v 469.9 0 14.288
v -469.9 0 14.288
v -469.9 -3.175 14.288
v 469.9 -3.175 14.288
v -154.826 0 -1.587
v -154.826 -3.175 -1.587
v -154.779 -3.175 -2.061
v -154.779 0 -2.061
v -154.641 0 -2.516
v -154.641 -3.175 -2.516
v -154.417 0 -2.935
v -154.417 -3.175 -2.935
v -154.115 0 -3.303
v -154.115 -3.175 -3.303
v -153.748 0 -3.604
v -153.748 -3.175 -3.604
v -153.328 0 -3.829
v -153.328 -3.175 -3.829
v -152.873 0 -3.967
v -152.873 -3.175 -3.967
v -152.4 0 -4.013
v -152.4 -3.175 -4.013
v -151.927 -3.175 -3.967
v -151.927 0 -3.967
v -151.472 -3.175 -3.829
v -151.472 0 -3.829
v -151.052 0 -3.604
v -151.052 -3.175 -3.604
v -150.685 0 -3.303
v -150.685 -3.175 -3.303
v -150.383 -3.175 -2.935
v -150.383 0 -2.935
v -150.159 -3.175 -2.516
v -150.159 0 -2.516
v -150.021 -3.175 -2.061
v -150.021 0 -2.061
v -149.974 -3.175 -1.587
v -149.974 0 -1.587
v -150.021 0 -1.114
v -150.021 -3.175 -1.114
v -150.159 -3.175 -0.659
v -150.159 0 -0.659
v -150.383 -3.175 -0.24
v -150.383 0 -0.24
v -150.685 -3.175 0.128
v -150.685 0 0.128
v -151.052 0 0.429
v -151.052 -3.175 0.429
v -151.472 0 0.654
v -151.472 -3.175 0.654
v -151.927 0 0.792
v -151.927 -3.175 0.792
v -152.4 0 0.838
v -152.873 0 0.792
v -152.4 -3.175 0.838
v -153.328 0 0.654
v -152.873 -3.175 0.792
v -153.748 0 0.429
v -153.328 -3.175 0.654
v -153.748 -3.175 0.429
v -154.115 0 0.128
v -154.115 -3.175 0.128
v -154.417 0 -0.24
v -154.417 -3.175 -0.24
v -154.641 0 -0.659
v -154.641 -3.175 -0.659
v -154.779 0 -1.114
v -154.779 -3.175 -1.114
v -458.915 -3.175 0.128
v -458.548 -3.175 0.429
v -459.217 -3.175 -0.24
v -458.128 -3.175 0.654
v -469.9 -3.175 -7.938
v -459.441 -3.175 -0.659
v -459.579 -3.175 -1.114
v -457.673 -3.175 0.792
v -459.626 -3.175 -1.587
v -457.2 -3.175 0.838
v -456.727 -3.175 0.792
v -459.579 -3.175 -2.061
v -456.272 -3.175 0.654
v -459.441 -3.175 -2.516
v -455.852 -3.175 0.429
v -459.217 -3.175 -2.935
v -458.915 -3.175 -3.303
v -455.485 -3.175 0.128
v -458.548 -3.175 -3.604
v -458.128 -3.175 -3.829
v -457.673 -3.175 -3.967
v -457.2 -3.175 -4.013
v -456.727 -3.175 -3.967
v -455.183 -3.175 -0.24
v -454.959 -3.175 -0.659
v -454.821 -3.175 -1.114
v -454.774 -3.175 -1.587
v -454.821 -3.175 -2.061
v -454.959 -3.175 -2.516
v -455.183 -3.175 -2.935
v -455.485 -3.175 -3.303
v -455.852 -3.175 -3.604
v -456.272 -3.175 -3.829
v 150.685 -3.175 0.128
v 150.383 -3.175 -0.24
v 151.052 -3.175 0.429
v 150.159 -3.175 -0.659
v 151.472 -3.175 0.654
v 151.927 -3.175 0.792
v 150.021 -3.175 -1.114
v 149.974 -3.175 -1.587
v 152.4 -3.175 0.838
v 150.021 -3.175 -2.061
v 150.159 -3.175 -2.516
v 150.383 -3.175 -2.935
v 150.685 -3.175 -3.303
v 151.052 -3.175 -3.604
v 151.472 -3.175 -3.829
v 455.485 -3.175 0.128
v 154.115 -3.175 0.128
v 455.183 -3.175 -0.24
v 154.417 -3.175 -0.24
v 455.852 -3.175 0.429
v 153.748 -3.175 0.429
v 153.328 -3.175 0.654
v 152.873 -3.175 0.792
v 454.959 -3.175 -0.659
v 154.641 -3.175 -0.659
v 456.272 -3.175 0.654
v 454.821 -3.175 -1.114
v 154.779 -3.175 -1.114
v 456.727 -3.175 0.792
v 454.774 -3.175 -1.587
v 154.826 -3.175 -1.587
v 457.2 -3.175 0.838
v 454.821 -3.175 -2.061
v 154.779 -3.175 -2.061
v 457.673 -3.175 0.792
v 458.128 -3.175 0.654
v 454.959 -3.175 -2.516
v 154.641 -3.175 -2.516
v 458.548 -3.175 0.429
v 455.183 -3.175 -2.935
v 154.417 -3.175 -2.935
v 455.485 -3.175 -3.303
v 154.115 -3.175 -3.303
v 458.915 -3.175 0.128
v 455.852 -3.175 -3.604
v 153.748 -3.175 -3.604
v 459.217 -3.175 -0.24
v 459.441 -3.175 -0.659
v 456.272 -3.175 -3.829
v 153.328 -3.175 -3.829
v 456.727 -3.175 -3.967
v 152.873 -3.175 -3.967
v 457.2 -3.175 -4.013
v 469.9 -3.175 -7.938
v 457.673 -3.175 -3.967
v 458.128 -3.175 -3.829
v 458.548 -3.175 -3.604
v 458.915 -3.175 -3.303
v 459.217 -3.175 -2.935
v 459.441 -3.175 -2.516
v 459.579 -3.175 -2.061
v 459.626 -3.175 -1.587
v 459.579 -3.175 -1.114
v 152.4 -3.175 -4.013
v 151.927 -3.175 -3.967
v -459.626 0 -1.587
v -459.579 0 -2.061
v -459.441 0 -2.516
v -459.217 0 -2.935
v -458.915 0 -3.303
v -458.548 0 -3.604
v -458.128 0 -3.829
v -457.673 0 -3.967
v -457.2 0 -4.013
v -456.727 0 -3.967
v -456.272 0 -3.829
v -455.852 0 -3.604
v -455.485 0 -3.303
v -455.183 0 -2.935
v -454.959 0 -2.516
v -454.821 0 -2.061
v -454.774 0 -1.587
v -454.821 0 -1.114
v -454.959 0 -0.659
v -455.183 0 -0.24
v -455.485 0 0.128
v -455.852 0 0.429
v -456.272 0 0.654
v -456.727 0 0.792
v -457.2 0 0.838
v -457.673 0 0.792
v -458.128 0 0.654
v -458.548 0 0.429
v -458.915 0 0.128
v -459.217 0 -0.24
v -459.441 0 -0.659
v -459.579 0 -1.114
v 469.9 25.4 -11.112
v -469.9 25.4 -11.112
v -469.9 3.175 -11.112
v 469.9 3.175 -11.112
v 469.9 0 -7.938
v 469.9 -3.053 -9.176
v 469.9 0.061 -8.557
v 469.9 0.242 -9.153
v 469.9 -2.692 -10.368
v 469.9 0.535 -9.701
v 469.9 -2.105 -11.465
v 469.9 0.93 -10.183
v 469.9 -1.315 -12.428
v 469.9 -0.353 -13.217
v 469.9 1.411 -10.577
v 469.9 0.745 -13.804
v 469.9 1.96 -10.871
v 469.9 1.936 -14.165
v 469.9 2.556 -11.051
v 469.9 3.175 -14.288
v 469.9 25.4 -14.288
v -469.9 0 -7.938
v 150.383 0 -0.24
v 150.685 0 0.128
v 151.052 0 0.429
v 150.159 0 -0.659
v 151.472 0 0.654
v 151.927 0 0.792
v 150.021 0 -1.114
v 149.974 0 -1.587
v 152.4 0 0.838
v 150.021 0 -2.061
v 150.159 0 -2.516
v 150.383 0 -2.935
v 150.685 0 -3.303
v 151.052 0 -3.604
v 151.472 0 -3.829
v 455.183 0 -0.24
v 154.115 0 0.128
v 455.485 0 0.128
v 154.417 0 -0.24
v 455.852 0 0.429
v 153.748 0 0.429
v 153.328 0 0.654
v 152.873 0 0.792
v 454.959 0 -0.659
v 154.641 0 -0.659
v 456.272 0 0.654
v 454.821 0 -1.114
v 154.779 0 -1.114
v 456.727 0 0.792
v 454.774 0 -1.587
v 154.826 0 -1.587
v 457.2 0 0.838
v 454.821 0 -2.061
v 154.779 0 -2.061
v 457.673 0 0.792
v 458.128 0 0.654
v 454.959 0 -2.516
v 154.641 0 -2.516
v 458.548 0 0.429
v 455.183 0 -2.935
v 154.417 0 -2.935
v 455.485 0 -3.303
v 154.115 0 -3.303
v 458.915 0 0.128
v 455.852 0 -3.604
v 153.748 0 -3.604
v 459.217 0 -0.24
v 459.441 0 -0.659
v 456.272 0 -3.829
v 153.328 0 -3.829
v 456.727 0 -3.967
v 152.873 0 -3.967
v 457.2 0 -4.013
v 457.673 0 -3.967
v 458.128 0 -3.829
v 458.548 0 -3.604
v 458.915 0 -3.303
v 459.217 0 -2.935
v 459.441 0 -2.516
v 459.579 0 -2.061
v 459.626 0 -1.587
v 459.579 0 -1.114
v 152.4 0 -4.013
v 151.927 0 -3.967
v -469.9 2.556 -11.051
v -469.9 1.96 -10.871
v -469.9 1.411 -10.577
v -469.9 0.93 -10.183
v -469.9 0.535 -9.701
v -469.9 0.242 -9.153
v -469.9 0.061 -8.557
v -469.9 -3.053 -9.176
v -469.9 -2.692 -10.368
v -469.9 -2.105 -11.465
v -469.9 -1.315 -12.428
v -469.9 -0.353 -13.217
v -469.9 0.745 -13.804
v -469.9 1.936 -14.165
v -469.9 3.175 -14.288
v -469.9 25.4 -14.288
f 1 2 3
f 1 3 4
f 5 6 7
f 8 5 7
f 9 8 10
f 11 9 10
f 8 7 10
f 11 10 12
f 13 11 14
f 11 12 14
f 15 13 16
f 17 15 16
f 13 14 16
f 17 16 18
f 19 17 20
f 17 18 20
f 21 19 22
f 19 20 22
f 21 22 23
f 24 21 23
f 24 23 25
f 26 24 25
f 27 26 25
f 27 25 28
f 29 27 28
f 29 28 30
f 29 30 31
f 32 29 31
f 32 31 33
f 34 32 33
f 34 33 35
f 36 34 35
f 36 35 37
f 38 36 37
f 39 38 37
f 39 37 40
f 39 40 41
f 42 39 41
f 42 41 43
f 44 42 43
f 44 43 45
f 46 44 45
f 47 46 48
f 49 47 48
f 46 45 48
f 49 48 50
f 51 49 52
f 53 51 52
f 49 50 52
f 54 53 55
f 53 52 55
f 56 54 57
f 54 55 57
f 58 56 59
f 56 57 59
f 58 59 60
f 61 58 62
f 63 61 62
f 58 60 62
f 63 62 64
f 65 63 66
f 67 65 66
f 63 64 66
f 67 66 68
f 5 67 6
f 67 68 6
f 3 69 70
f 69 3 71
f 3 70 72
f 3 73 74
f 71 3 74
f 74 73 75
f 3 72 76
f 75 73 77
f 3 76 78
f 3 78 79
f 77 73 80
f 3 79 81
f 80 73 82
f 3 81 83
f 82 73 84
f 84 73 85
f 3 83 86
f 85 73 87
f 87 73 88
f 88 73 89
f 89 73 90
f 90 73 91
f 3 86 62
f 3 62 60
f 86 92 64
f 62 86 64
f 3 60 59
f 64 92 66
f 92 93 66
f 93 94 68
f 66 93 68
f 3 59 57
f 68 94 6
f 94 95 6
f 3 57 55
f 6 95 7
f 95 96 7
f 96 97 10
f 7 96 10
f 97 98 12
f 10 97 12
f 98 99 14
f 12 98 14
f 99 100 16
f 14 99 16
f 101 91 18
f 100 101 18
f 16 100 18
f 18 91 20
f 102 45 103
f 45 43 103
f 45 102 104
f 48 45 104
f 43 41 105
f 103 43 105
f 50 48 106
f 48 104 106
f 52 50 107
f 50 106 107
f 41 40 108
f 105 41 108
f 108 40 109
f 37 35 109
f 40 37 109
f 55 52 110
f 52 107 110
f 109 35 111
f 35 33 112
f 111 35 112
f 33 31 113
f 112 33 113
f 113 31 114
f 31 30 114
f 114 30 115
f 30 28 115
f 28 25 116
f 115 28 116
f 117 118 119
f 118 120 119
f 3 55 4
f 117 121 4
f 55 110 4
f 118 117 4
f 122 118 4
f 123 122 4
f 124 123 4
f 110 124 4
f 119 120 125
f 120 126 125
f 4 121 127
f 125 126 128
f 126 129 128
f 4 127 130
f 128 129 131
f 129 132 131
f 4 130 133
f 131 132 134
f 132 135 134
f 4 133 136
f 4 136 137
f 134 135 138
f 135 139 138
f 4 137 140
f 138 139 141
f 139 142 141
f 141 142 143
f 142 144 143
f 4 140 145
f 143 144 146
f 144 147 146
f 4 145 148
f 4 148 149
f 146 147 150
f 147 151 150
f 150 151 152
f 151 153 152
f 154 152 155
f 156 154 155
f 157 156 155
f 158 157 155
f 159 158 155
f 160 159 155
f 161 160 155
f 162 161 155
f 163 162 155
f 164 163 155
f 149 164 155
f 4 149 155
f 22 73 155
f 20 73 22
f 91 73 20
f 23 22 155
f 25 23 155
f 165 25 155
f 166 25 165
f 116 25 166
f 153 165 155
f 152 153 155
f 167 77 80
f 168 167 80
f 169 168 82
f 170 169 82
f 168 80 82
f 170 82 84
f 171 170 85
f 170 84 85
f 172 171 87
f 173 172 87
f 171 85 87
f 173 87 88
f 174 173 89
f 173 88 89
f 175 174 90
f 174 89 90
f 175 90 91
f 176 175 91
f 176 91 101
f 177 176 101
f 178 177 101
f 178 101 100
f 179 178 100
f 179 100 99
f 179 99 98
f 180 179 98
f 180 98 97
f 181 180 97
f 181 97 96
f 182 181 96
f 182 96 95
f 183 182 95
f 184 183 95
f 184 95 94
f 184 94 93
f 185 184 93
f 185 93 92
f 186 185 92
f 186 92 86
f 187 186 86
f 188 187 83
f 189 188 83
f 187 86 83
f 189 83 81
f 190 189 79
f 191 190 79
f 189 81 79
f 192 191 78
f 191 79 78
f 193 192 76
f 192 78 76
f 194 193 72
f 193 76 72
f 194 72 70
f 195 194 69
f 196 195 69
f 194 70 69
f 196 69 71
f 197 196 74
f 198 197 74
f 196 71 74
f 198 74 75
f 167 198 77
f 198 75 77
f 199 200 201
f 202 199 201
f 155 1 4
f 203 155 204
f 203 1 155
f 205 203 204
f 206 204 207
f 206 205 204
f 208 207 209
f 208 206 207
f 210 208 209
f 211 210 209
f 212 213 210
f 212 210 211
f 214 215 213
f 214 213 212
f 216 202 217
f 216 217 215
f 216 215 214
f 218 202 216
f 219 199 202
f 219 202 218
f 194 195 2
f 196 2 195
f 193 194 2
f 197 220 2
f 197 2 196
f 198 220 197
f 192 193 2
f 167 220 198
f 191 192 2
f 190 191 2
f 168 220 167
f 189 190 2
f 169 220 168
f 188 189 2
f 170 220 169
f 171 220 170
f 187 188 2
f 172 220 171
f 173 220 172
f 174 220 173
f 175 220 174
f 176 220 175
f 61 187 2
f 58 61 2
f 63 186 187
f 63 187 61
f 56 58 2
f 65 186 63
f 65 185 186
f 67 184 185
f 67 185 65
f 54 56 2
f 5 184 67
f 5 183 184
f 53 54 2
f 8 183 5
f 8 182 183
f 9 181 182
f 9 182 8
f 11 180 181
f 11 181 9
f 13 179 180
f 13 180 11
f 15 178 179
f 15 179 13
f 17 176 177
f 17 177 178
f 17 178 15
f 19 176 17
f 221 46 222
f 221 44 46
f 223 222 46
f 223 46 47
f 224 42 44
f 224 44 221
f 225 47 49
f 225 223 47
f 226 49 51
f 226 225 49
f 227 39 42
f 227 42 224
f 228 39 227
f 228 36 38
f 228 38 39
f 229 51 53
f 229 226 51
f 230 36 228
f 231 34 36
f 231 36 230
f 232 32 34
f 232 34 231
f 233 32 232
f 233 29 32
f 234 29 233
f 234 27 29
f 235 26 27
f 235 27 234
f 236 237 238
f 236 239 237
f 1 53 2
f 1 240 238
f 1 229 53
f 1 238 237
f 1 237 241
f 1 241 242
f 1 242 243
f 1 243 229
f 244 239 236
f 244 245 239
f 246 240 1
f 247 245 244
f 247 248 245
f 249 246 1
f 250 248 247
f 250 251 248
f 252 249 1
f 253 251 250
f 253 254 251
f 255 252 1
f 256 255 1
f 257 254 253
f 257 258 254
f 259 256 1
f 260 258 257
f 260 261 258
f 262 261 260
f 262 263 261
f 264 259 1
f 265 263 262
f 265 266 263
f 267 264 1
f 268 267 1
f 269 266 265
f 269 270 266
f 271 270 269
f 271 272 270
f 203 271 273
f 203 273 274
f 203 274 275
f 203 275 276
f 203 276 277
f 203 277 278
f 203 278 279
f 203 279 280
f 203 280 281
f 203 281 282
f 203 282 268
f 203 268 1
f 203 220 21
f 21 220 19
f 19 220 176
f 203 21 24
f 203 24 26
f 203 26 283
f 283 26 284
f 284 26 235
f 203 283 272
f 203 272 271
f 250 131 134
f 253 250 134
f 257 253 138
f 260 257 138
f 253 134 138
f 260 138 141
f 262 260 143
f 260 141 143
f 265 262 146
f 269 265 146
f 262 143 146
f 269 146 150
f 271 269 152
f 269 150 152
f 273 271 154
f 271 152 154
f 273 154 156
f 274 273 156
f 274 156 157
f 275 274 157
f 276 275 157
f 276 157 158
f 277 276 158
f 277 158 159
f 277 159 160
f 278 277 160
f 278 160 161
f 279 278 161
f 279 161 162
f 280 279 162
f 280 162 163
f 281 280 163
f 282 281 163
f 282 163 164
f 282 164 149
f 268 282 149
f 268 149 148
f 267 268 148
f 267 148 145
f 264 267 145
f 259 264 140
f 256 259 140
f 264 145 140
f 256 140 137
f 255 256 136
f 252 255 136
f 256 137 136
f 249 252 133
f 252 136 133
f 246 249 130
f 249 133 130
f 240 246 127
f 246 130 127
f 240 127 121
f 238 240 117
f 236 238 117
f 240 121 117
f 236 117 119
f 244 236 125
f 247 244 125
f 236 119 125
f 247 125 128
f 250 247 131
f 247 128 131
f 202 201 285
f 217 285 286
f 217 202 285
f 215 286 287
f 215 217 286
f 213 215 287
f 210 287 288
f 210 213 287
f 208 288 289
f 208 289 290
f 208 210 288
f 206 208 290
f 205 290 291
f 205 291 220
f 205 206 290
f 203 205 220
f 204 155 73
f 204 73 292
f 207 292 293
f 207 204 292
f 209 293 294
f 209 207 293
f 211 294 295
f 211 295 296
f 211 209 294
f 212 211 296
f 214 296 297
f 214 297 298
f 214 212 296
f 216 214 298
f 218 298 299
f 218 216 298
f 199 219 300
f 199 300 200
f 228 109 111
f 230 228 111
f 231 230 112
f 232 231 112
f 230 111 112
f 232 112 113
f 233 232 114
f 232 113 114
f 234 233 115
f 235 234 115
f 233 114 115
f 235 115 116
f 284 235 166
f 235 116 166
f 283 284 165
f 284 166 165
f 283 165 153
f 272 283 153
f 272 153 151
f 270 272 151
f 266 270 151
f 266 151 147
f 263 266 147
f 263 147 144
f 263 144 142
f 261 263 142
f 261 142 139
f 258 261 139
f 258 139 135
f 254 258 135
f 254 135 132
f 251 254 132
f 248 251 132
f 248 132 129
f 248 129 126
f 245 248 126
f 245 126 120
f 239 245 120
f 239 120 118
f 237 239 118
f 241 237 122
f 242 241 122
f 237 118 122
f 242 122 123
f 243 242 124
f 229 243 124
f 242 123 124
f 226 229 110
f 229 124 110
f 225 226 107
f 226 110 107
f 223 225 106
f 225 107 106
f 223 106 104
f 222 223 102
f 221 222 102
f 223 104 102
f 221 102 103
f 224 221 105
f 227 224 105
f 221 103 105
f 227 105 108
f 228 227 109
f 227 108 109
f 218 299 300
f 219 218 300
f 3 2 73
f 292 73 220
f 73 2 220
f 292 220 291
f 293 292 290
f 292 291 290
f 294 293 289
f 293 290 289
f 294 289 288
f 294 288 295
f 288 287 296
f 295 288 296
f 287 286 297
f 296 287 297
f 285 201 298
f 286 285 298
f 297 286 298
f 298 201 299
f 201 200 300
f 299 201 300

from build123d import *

# Parameters (mm, degrees)
SKETCH1_W                    = 939.8
SKETCH1_H                    = 28.575
BASE_FLANGE1_DEPTH           = 3.175
EDGE_FLANGE1_STRIP_W         = 19.05
EDGE_FLANGE1_STRIP_H         = 3.175
EDGE_FLANGE1_STRIP_CUT_DEPTH = 939.8
EDGE_FLANGE1_DEPTH           = 939.8
F_11_0_191_DIAMETER_HOLE1_D  = 4.8514
LPATTERN1_COUNT              = 4
LPATTERN1_PITCH              = 304.8


# Sheet-metal steps are written as plain solids
with BuildPart() as part:
    # Sketch1 → Base-Flange1 (new body)
    with BuildSketch(Plane(origin=(0, 0, 0), x_dir=(1, 0, 0), z_dir=(0, 1, 0))):
        Rectangle(SKETCH1_W, SKETCH1_H)
    extrude(amount=-BASE_FLANGE1_DEPTH)

    # Edge-Flange1 strip (across the edge) → Edge-Flange1 strip cut (cut)
    with BuildSketch(Plane(origin=(469.9, 0, -14.2875), x_dir=(0, 0, 1), z_dir=(-1, 0, 0))):
        with Locations((-3.175, -1.5875)):
            Rectangle(EDGE_FLANGE1_STRIP_W, EDGE_FLANGE1_STRIP_H)
    extrude(amount=EDGE_FLANGE1_STRIP_CUT_DEPTH, mode=Mode.SUBTRACT)

    # Edge-Flange1 section (across the edge) → Edge-Flange1 (add)
    with BuildSketch(Plane(origin=(469.9, 0, -14.2875), x_dir=(0, 0, 1), z_dir=(-1, 0, 0))):
        with BuildLine():
            Line((0, 3.175), (0, 25.4))
            Line((0, 25.4), (3.175, 25.4))
            Line((3.175, 25.4), (3.175, 3.175))
            ThreePointArc((3.175, 3.175), (4.10493597, 0.92993597), (6.35, 0))
            Line((6.35, 0), (6.35, -3.175))
            ThreePointArc((6.35, -3.175), (1.859871939, -1.315128061), (0, 3.175))
        make_face()
    extrude(amount=EDGE_FLANGE1_DEPTH)

    # #11 (0.191) Diameter Hole1 (through all)
    with Locations(Plane(origin=(0, 0, 0), x_dir=(1, 0, 0), z_dir=(0, 1, 0))):
        with Locations((-457.2, 1.5875)):
            f_11_0_191_diameter_hole1 = Hole(F_11_0_191_DIAMETER_HOLE1_D / 2)

    # LPattern1: #11 (0.191) Diameter Hole1 ×4
    with Locations(*[(i * LPATTERN1_PITCH, 0, 0) for i in range(1, LPATTERN1_COUNT)]):
        add(f_11_0_191_diameter_hole1, mode=Mode.SUBTRACT)


solid = part.part
